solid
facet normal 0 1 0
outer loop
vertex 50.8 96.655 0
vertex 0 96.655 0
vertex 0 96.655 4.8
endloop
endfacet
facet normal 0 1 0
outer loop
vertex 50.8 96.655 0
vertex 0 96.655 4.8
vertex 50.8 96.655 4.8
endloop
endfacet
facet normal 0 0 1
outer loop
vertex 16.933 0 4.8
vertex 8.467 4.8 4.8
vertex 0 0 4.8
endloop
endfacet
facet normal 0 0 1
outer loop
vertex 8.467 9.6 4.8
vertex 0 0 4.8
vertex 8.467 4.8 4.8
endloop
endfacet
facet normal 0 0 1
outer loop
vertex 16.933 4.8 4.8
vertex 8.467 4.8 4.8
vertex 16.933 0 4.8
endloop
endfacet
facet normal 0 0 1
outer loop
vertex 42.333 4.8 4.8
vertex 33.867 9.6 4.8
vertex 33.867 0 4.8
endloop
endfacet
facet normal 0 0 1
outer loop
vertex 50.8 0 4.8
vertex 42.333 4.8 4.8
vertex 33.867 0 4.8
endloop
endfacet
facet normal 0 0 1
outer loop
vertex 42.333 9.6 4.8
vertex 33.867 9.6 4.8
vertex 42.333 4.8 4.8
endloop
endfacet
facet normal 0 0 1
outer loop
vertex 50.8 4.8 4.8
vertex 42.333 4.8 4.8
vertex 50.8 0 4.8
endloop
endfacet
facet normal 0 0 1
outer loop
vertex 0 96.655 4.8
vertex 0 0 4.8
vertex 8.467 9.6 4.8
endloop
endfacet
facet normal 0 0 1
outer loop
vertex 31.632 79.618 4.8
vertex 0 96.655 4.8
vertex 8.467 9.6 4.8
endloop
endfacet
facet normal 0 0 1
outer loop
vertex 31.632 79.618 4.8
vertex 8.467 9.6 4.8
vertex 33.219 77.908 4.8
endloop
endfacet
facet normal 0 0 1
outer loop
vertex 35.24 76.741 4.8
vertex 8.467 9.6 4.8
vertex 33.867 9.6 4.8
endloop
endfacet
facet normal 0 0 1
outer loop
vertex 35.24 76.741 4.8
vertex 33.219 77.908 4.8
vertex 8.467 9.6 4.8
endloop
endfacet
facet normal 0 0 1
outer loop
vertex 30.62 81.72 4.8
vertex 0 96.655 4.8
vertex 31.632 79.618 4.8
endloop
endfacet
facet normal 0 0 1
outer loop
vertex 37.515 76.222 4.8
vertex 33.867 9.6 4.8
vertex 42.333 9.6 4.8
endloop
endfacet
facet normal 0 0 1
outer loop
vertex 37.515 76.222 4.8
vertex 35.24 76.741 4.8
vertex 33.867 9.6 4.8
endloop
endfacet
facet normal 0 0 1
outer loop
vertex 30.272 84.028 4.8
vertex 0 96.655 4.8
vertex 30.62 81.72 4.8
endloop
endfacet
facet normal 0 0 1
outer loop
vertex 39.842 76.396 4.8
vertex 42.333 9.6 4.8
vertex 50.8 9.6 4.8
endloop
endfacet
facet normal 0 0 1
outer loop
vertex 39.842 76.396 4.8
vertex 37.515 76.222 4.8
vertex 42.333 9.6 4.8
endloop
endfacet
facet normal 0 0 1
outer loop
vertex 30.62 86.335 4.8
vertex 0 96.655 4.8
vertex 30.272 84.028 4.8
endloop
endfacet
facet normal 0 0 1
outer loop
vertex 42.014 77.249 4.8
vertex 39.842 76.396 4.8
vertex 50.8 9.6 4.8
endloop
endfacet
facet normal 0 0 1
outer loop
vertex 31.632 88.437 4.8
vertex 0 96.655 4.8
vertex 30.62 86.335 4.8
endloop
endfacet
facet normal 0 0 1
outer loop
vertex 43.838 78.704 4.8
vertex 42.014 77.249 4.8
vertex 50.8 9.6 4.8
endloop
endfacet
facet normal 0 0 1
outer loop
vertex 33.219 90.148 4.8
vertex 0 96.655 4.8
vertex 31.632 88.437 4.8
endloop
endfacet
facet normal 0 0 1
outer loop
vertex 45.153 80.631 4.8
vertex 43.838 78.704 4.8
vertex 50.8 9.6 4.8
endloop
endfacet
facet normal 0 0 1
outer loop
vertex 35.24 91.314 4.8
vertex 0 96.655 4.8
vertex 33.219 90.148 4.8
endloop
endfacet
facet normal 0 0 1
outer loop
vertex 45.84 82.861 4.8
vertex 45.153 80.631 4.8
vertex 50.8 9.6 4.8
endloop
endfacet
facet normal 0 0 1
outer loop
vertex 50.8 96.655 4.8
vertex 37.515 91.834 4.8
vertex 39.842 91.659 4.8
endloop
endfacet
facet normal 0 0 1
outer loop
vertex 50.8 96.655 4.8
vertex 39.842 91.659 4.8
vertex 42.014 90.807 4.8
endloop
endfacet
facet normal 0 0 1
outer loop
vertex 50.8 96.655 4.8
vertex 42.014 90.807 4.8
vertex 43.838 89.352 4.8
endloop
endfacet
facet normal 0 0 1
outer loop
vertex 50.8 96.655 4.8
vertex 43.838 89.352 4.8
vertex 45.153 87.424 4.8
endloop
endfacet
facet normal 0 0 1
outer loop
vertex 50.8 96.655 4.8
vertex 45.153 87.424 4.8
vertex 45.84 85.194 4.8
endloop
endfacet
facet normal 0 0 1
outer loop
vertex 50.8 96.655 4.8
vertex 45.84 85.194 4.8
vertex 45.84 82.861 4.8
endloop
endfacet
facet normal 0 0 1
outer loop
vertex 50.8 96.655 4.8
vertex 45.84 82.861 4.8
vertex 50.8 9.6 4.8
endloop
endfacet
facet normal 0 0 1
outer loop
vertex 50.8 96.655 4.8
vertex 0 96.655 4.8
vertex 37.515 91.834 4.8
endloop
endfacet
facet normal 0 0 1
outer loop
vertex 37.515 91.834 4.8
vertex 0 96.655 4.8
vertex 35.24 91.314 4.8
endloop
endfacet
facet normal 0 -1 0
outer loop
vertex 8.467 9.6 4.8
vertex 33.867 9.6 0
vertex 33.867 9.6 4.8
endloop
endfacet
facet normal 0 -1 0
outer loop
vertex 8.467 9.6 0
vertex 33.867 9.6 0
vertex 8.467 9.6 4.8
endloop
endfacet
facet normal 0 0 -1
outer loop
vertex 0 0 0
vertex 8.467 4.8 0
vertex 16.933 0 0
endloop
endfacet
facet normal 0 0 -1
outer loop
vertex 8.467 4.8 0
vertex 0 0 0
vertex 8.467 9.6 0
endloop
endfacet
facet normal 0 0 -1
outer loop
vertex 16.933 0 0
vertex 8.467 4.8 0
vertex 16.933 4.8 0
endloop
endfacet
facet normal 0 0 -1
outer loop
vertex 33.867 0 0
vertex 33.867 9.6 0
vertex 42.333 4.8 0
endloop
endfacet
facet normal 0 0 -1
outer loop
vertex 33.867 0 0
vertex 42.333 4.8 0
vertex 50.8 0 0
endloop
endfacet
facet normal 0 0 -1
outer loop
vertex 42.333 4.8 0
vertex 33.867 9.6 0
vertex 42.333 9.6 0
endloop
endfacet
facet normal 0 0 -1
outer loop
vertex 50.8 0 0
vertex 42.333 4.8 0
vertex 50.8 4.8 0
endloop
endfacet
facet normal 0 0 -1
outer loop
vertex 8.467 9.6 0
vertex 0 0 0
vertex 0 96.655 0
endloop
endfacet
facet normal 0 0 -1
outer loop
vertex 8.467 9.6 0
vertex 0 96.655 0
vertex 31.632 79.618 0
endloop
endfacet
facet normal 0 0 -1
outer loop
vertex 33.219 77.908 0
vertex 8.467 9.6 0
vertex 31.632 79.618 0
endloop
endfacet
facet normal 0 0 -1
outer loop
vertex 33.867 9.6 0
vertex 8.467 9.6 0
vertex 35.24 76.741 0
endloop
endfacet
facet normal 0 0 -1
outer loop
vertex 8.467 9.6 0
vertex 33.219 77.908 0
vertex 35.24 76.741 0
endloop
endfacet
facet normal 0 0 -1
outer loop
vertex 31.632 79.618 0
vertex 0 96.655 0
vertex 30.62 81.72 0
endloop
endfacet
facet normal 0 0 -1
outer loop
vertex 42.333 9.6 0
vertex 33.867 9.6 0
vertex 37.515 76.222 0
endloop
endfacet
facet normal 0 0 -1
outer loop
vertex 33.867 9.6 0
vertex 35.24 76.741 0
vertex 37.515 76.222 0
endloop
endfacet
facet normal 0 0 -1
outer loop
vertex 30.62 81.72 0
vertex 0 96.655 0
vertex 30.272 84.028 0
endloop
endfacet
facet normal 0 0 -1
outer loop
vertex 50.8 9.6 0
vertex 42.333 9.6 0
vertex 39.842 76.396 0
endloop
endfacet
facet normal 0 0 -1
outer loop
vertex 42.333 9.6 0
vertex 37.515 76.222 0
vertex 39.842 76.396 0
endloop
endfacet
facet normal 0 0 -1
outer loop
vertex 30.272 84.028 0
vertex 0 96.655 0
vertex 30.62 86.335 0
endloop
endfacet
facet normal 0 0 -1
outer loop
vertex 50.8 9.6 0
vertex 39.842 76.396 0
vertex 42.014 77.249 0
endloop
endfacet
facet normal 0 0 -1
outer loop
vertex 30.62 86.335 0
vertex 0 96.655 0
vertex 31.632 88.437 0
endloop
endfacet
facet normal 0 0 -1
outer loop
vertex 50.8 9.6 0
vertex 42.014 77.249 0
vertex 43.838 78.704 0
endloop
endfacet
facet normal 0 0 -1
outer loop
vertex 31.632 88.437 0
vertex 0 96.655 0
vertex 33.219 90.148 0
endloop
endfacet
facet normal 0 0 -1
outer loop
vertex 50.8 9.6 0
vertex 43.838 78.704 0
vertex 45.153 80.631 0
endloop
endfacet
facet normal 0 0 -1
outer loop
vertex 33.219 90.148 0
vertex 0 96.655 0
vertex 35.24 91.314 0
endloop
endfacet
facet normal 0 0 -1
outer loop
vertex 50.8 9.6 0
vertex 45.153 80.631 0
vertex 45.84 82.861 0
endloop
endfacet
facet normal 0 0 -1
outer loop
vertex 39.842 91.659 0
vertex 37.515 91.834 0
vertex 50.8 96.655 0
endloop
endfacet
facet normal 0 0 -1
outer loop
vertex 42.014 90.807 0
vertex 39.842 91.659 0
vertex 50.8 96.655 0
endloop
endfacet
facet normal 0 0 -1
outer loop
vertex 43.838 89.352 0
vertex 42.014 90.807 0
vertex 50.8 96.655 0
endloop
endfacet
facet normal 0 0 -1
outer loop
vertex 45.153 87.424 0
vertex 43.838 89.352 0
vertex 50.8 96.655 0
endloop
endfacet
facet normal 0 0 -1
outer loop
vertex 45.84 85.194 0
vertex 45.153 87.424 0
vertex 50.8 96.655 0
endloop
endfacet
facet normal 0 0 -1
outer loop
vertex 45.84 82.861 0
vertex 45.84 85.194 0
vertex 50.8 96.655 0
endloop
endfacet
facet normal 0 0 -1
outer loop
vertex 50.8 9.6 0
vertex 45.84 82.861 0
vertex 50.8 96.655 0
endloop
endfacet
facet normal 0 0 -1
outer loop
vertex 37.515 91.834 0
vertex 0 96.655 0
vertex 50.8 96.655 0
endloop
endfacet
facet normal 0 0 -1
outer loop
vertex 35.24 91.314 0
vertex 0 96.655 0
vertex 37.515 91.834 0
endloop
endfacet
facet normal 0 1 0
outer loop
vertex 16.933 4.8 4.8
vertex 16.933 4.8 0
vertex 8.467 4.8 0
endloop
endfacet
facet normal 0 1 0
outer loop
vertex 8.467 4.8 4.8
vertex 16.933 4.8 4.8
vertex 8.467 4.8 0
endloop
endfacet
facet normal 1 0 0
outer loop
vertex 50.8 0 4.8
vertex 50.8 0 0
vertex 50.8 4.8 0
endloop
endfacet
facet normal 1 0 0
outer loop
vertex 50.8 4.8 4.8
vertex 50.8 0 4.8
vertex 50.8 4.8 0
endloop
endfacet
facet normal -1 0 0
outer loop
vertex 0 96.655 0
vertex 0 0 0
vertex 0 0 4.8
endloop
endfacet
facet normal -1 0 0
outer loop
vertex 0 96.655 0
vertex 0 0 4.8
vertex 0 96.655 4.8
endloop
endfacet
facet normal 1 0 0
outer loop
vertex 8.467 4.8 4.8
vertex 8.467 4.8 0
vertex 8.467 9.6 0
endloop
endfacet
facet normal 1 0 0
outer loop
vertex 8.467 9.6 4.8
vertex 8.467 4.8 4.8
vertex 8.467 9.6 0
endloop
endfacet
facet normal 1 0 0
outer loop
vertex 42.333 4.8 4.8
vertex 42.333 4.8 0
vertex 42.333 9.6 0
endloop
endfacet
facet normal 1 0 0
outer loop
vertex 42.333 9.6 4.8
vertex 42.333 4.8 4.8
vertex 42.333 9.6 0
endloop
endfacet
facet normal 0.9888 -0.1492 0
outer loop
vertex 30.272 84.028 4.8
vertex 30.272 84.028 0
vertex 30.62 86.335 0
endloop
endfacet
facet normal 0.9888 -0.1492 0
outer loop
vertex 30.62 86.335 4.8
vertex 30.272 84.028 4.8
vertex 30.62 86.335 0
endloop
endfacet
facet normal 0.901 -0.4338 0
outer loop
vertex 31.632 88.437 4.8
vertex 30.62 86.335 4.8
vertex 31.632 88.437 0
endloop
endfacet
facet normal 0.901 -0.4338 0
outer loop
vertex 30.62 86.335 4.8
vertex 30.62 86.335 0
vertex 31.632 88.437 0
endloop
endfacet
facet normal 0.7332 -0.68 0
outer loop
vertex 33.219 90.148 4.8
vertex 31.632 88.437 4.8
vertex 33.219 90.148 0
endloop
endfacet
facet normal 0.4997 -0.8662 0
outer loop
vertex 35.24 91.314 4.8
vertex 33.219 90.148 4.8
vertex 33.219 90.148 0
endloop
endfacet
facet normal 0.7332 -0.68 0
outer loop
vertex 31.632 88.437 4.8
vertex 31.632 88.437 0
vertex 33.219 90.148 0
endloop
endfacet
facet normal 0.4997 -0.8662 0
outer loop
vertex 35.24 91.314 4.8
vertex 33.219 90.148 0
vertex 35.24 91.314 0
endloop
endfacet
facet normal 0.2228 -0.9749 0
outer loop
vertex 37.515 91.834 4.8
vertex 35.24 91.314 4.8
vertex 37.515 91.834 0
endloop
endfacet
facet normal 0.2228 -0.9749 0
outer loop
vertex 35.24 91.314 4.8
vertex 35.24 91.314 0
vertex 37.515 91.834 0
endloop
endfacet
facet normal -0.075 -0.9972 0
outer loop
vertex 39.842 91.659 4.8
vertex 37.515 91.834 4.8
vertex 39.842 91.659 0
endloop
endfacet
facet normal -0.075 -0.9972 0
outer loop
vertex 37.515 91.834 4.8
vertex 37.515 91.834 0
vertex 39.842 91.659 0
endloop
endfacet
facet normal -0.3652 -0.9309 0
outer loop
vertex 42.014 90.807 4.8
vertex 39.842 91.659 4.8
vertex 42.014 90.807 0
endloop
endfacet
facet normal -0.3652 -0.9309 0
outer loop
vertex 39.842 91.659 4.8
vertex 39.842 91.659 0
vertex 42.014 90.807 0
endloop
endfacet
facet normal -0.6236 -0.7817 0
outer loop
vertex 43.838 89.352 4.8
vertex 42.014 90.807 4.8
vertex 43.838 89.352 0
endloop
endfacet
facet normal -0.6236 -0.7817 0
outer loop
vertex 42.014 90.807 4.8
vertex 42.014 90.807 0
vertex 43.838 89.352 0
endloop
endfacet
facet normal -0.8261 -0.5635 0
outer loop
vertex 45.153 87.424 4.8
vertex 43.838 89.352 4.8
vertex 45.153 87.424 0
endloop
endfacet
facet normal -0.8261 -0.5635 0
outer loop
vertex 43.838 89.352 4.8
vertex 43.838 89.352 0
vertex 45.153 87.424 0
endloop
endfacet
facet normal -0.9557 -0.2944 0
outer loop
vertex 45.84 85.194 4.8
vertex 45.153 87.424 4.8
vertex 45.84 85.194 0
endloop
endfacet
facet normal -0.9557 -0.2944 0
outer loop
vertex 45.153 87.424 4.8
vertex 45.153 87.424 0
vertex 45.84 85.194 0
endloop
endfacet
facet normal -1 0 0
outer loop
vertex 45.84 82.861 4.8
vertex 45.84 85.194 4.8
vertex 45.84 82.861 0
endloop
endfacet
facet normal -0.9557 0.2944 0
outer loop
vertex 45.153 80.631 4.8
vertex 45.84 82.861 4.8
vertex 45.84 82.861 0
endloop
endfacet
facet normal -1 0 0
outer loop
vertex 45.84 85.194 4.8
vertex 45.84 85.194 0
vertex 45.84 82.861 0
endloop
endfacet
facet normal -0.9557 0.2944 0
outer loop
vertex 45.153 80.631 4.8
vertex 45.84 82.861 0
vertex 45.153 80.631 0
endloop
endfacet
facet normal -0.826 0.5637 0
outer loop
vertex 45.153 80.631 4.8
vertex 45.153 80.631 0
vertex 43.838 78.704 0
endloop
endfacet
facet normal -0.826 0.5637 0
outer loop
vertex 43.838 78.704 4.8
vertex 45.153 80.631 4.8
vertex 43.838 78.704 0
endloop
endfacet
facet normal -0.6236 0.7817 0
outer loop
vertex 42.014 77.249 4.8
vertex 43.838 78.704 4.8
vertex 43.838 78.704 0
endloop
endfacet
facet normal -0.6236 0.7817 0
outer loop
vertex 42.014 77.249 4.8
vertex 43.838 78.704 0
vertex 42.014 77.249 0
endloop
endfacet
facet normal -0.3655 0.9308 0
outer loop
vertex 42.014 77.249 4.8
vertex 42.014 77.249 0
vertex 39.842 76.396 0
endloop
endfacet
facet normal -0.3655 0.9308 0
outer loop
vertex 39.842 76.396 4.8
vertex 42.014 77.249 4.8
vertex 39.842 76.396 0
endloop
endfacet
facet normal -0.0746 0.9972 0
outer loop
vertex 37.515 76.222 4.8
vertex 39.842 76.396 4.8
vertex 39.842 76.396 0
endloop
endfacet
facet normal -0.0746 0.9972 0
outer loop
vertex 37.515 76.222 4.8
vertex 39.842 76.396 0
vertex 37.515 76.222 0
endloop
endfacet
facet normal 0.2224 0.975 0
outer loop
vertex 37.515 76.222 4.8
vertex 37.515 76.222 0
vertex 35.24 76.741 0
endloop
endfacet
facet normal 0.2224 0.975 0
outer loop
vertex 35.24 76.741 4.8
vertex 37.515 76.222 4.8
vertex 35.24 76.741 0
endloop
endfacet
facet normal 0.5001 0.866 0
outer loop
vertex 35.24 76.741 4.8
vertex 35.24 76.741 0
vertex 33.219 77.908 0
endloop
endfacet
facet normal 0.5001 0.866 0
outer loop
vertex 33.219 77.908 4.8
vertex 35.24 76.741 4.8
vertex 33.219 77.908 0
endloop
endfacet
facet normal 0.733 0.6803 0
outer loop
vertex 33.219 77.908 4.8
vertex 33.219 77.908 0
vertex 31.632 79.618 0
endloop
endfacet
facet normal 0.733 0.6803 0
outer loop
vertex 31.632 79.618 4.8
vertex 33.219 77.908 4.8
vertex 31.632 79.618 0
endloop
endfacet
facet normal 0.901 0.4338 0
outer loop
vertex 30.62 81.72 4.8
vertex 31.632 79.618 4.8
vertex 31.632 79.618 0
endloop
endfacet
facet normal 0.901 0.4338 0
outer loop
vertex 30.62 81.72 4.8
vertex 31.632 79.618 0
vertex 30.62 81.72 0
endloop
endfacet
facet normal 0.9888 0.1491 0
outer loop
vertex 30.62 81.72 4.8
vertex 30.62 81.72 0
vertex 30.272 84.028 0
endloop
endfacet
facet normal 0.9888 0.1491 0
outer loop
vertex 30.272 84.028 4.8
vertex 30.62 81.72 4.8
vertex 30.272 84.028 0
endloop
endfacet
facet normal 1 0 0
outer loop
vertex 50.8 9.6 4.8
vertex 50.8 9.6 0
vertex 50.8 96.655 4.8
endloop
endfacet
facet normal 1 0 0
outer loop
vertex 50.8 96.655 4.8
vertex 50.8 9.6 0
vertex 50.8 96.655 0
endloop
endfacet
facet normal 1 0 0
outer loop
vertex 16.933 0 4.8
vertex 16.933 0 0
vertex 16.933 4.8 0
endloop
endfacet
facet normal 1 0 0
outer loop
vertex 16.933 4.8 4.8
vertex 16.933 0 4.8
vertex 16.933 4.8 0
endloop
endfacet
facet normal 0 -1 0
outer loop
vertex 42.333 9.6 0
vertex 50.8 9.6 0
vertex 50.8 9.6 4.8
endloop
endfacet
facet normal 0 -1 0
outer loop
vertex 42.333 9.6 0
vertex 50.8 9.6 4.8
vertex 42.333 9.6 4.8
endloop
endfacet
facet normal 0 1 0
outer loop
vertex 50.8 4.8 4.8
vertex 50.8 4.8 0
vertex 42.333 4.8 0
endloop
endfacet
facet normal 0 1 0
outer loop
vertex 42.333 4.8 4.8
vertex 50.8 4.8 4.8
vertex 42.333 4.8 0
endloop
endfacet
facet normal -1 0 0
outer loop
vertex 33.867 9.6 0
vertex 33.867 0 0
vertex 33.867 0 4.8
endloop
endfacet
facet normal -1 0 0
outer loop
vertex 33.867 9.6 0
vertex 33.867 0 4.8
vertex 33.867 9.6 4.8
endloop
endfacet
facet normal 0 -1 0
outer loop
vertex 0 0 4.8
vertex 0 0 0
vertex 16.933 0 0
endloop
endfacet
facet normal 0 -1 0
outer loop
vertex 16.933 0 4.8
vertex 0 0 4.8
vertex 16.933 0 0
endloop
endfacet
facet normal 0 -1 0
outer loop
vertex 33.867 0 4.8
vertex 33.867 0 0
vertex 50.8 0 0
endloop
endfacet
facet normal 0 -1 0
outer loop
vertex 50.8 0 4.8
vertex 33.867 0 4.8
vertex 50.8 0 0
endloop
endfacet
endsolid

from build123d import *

# Parameters (mm, degrees)
SKETCH1_W           = 50.8
SKETCH1_H           = 96.655493252
BOSS_EXTRUDE1_DEPTH = 4.800000052
SKETCH3_R           = 7.8277466
CUT_EXTRUDE2_DEPTH  = 110.297595473
SKETCH4_W           = 8.466666667
SKETCH4_H           = 4.800000052
SKETCH4_W_2         = 8.466666666
CUT_EXTRUDE4_DEPTH  = 110.297595473
SKETCH5_W           = 16.933333334
SKETCH5_H           = 9.600000104
CUT_EXTRUDE5_DEPTH  = 110.297595473


with BuildPart() as part:
    # Sketch1 → Boss-Extrude1 (new body)
    with BuildSketch(Plane.XY):
        with Locations((25.4, 48.327746626)):
            Rectangle(SKETCH1_W, SKETCH1_H)
    extrude(amount=BOSS_EXTRUDE1_DEPTH)

    # Sketch3 → Cut-Extrude2 (cut, through all)
    with BuildSketch(Plane(origin=(0, 0, 0), x_dir=(-1, 0, 0), z_dir=(0, 0, -1))):
        with Locations((-38.1, 84.0277466)):
            Circle(SKETCH3_R)
    extrude(amount=-CUT_EXTRUDE2_DEPTH, mode=Mode.SUBTRACT)

    # Sketch4 → Cut-Extrude4 (cut, through all)
    with BuildSketch(Plane(origin=(0, 0, 0), x_dir=(-1, 0, 0), z_dir=(0, 0, -1))):
        with Locations((-46.566666667, 7.200000078)):
            Rectangle(SKETCH4_W, SKETCH4_H)
        with Locations((-12.7, 7.200000078)):
            Rectangle(SKETCH4_W_2, SKETCH4_H)
    extrude(amount=-CUT_EXTRUDE4_DEPTH, mode=Mode.SUBTRACT)

    # Sketch5 → Cut-Extrude5 (cut, through all)
    with BuildSketch(Plane(origin=(0, 0, 0), x_dir=(-1, 0, 0), z_dir=(0, 0, -1))):
        with Locations((-25.4, 4.800000052)):
            Rectangle(SKETCH5_W, SKETCH5_H)
    extrude(amount=-CUT_EXTRUDE5_DEPTH, mode=Mode.SUBTRACT)


solid = part.part
